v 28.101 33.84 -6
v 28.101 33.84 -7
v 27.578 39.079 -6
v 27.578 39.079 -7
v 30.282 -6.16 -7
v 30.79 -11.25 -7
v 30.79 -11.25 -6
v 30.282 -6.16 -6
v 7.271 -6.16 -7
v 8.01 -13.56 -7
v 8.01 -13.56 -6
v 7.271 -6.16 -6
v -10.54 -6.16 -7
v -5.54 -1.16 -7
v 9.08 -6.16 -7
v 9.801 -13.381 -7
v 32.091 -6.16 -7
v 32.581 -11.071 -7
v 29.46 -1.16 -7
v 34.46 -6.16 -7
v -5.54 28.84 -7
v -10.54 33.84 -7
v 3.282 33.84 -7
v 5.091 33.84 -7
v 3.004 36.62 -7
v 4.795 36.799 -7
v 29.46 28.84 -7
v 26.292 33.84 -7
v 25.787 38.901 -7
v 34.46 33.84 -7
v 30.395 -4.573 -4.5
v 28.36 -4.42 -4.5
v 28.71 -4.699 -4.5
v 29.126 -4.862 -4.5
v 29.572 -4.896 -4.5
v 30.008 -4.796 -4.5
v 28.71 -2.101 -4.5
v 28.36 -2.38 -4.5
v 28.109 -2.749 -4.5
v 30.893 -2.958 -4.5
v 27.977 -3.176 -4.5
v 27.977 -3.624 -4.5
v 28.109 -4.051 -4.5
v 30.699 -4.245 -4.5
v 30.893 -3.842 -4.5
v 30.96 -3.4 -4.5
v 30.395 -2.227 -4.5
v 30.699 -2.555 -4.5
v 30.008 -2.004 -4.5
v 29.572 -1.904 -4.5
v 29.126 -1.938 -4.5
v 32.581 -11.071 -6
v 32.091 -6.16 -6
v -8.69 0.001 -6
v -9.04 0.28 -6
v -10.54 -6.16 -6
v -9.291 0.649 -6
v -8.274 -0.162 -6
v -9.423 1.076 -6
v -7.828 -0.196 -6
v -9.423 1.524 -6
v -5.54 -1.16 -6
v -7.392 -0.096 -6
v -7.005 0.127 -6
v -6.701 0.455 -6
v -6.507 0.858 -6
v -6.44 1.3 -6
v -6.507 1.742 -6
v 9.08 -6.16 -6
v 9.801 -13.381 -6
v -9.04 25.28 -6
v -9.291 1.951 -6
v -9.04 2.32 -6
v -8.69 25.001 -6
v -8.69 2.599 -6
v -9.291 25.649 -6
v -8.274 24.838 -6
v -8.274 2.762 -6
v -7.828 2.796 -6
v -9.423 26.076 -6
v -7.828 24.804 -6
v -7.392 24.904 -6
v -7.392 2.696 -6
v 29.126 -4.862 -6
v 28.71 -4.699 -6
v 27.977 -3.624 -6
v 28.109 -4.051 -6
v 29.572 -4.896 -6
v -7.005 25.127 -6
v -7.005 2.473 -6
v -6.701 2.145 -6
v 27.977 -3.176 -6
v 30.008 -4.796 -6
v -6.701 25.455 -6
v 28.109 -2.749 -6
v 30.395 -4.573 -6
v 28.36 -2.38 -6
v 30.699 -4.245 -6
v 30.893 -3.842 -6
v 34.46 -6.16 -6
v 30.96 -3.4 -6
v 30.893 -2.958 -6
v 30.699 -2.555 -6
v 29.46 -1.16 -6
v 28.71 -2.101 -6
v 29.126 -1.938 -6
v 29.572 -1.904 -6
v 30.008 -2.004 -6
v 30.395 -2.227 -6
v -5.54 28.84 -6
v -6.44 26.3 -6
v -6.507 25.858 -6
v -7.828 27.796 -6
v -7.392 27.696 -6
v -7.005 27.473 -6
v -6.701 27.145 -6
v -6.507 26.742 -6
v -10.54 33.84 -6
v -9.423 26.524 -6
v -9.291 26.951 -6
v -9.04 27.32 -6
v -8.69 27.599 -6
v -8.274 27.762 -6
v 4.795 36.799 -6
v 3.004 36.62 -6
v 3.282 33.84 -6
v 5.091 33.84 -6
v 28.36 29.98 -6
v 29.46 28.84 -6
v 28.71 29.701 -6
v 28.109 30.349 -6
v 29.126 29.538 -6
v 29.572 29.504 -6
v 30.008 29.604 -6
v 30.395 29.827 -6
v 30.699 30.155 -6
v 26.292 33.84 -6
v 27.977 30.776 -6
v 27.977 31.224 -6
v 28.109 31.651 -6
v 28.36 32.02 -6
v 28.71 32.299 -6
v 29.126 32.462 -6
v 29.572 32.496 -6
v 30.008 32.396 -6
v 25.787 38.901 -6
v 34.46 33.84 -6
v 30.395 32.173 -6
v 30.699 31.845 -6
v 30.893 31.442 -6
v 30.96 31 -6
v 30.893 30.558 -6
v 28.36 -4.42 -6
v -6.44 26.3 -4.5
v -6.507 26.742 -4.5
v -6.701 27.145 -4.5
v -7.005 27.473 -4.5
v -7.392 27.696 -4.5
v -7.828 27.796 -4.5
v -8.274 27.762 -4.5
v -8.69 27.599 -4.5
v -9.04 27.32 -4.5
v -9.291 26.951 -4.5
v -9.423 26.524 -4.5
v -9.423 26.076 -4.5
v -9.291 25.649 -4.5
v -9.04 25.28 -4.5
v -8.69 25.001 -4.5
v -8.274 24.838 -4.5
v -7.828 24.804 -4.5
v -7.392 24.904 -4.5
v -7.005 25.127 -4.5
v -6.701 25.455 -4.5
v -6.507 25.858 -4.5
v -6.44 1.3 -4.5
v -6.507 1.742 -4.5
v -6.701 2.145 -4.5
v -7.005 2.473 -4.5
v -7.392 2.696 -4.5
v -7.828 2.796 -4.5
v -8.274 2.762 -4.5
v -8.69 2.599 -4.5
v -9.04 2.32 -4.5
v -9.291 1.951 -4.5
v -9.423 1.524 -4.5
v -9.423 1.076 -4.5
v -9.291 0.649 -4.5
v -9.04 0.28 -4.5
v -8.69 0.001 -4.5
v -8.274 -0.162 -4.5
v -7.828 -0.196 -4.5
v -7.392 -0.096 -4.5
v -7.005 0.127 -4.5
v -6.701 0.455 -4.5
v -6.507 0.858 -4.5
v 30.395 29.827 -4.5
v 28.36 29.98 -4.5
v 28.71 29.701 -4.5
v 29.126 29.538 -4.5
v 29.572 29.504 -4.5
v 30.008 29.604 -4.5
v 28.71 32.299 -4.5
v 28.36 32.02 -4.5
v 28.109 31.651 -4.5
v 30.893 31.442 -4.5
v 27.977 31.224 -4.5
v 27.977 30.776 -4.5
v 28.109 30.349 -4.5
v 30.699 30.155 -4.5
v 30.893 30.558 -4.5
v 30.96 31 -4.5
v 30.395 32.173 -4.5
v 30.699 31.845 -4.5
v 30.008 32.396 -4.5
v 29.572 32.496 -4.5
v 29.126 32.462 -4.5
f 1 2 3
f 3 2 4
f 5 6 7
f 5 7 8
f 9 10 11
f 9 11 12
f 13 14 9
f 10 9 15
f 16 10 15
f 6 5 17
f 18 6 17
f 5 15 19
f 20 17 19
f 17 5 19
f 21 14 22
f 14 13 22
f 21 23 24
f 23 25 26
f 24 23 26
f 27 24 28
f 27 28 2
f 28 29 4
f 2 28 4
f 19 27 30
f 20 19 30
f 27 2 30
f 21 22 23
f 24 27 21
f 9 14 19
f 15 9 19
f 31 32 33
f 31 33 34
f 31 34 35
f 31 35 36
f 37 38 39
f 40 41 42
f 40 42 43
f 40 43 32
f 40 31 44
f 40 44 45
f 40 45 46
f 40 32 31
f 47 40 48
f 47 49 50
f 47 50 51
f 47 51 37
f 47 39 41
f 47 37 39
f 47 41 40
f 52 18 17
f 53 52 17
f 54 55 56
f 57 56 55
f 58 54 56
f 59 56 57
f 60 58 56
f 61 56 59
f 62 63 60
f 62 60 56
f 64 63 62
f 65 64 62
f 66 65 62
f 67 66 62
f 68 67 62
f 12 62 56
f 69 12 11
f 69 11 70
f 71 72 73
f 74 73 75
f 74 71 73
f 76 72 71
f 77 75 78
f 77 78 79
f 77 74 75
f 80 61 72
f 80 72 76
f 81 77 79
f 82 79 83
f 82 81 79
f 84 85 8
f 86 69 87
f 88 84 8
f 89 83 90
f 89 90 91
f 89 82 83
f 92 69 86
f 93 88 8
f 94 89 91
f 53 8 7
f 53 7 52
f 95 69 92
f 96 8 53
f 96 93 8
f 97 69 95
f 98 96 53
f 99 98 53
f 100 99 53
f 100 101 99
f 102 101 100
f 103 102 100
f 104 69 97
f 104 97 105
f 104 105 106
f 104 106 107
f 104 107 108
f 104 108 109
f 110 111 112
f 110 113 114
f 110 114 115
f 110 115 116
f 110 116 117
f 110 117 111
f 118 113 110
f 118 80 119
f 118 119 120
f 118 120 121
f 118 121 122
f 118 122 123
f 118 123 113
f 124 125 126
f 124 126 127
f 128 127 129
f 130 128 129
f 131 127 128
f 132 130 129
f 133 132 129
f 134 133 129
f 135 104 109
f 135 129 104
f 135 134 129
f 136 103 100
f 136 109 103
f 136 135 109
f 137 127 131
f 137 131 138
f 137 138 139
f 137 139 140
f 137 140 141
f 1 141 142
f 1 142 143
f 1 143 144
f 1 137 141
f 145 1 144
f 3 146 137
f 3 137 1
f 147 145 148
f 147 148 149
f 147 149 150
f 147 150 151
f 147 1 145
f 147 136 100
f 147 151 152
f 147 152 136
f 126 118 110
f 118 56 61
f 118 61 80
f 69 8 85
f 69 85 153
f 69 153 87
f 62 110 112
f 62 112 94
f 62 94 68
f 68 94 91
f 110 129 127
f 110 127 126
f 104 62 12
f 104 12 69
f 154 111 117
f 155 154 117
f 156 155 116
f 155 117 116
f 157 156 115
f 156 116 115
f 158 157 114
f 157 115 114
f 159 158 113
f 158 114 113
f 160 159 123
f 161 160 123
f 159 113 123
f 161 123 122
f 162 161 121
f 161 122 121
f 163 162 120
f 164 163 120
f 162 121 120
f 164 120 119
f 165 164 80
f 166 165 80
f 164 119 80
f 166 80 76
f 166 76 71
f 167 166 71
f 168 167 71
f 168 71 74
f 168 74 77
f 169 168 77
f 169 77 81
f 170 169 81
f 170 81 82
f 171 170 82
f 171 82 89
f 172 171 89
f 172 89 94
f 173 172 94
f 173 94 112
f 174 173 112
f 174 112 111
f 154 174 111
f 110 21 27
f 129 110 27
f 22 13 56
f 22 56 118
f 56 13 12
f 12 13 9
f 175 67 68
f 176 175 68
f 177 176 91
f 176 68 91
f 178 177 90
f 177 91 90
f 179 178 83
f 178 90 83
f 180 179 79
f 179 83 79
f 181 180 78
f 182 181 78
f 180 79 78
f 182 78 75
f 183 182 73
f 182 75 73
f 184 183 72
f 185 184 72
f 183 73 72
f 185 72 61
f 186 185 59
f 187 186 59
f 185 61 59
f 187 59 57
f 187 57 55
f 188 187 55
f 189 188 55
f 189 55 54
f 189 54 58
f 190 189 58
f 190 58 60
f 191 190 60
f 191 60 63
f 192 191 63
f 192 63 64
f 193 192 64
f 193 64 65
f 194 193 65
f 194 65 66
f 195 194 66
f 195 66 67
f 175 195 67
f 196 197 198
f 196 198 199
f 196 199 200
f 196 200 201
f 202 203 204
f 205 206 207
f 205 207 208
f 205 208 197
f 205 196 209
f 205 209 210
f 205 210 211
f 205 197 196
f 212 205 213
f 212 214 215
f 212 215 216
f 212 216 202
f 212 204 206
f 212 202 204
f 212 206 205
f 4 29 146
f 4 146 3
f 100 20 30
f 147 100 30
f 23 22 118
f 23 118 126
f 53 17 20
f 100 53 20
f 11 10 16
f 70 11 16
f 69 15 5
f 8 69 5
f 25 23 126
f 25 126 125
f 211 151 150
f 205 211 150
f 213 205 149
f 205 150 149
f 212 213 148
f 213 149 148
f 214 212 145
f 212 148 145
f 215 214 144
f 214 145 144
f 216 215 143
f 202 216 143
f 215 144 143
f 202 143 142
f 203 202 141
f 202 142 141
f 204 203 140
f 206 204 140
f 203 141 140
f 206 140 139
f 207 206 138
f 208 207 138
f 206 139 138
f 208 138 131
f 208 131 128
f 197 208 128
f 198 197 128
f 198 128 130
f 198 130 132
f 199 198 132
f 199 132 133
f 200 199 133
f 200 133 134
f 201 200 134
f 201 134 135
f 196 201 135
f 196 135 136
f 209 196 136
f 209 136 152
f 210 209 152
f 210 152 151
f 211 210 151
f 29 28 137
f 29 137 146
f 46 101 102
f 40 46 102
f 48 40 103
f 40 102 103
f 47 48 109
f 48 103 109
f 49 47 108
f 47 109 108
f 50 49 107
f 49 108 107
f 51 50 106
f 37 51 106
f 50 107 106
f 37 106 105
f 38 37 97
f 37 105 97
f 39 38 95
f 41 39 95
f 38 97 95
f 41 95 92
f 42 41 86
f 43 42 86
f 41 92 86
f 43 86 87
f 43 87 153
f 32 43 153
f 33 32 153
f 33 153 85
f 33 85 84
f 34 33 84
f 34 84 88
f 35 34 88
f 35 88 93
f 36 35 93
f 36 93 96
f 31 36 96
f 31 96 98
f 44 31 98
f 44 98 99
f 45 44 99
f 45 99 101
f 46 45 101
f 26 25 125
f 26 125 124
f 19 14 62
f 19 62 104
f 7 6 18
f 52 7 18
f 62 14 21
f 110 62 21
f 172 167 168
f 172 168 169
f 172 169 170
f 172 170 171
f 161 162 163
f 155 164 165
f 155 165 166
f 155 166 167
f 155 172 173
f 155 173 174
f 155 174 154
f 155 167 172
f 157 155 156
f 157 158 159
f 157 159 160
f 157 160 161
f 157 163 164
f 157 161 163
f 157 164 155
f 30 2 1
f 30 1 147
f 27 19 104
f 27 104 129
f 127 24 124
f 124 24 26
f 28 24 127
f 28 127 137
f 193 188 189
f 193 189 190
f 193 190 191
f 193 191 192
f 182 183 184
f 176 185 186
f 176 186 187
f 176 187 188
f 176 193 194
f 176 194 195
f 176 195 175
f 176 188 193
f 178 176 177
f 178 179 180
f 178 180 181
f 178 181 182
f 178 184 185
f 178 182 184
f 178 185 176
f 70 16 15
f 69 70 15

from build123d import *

# Parameters (mm, degrees)
CYLINDER039_R          = 1.5
CYLINDER039_DEPTH      = 1.6
BOX015_W               = 1.8
BOX015_H               = 6
BOX015_DEPTH           = 1
BOX015_PLACEMENT_ANGLE = 5.7
BOX016_W               = 1.8
BOX016_H               = 10
BOX016_DEPTH           = 1
BOX016_PLACEMENT_ANGLE = 5.7
BOX017_W               = 1.8
BOX017_H               = 10
BOX017_DEPTH           = 1
BOX017_PLACEMENT_ANGLE = 5.7
BOX018_W               = 1.8
BOX018_H               = 10
BOX018_DEPTH           = 1
BOX018_PLACEMENT_ANGLE = 5.7
BOX019_W               = 35
BOX019_H               = 30
BOX019_DEPTH           = 1
BOX_W                  = 45
BOX_H                  = 40
BOX_DEPTH              = 1


with BuildPart() as rc522_cyl_col1:
    # Cylinder039 → Cylinder039 (new body)
    with BuildSketch(Plane(origin=(32, -3.4, -6.1), x_dir=(1, 0, 0), z_dir=(0, 0, 1))):
        Circle(CYLINDER039_R)
    extrude(amount=CYLINDER039_DEPTH)


with BuildPart() as rc522_cyl_col004:
    # Clone015 base: copy of rc522-cyl-col1
    add(rc522_cyl_col1.part)


with BuildPart() as rc522_cyl_col004_1:
    # Clone015 placement: moved
    add(rc522_cyl_col004.part.moved(Location((-37.4, 29.7, 0))))


with BuildPart() as rc522_cyl_col003:
    # Clone014 base: copy of rc522-cyl-col1
    add(rc522_cyl_col1.part)


with BuildPart() as rc522_cyl_col003_1:
    # Clone014 placement: moved
    add(rc522_cyl_col003.part.moved(Location((-37.4, 4.7, 0))))


with BuildPart() as rc522_cyl_col002:
    # Clone013 base: copy of rc522-cyl-col1
    add(rc522_cyl_col1.part)


with BuildPart() as rc522_cyl_col002_1:
    # Clone013 placement: moved
    add(rc522_cyl_col002.part.moved(Location((0, 34.4, 0))))


with BuildPart() as cube011:
    # Box015 → Box015 (new body)
    with BuildSketch(Plane.XY):
        with Locations((0.9, 3)):
            Rectangle(BOX015_W, BOX015_H)
    extrude(amount=BOX015_DEPTH)


with BuildPart() as cube011_1:
    # Box015 placement: moved
    add(cube011.part.moved(Location((6.14, 30.65, -7))).rotate(Axis((6.14, 30.65, -7), (0, 0, 1)), BOX015_PLACEMENT_ANGLE))


with BuildPart() as cube012:
    # Box016 → Box016 (new body)
    with BuildSketch(Plane.XY):
        with Locations((0.9, 5)):
            Rectangle(BOX016_W, BOX016_H)
    extrude(amount=BOX016_DEPTH)


with BuildPart() as cube012_1:
    # Box016 placement: moved
    add(cube012.part.moved(Location((29.32, 28.95, -7))).rotate(Axis((29.32, 28.95, -7), (0, 0, 1)), BOX016_PLACEMENT_ANGLE))


with BuildPart() as cube013:
    # Box017 → Box017 (new body)
    with BuildSketch(Plane.XY):
        with Locations((0.9, 5)):
            Rectangle(BOX017_W, BOX017_H)
    extrude(amount=BOX017_DEPTH)


with BuildPart() as cube013_1:
    # Box017 placement: moved
    add(cube013.part.moved(Location((10.55, -13.56, -7))).rotate(Axis((10.55, -13.56, -7), (0, 0, 1)), BOX017_PLACEMENT_ANGLE))


with BuildPart() as cube014:
    # Box018 → Box018 (new body)
    with BuildSketch(Plane.XY):
        with Locations((0.9, 5)):
            Rectangle(BOX018_W, BOX018_H)
    extrude(amount=BOX018_DEPTH)


with BuildPart() as cube014_1:
    # Box018 placement: moved
    add(cube014.part.moved(Location((33.33, -11.25, -7))).rotate(Axis((33.33, -11.25, -7), (0, 0, 1)), BOX018_PLACEMENT_ANGLE))


with BuildPart() as cube015:
    # Box019 → Box019 (new body)
    with BuildSketch(Plane(origin=(-3, -1.16, -7), x_dir=(1, 0, 0), z_dir=(0, 0, 1))):
        with Locations((17.5, 15)):
            Rectangle(BOX019_W, BOX019_H)
    extrude(amount=BOX019_DEPTH)


with BuildPart() as plastic_substrate:
    # Box → Box (new body)
    with BuildSketch(Plane(origin=(-8, -6.16, -7), x_dir=(1, 0, 0), z_dir=(0, 0, 1))):
        with Locations((22.5, 20)):
            Rectangle(BOX_W, BOX_H)
    extrude(amount=BOX_DEPTH)

    # Cut006: cut Cube015
    add(cube015.part, mode=Mode.SUBTRACT)

    # Fusion014: union Cube014
    add(cube014_1.part)

    # Fusion015: union Cube013
    add(cube013_1.part)

    # Fusion016: union Cube012
    add(cube012_1.part)

    # Fusion017: union Cube011
    add(cube011_1.part)

    # Fusion018: union rc522-cyl-col1
    add(rc522_cyl_col1.part)

    # Fusion019: union rc522-cyl-col002
    add(rc522_cyl_col002_1.part)

    # Fusion020: union rc522-cyl-col003
    add(rc522_cyl_col003_1.part)

    # Fusion021: union rc522-cyl-col004
    add(rc522_cyl_col004_1.part)


with BuildPart() as plastic_substrate_1:
    # Fusion021 placement: moved
    add(plastic_substrate.part.moved(Location((-2.54, 0, 0))))


solid = plastic_substrate_1.part
